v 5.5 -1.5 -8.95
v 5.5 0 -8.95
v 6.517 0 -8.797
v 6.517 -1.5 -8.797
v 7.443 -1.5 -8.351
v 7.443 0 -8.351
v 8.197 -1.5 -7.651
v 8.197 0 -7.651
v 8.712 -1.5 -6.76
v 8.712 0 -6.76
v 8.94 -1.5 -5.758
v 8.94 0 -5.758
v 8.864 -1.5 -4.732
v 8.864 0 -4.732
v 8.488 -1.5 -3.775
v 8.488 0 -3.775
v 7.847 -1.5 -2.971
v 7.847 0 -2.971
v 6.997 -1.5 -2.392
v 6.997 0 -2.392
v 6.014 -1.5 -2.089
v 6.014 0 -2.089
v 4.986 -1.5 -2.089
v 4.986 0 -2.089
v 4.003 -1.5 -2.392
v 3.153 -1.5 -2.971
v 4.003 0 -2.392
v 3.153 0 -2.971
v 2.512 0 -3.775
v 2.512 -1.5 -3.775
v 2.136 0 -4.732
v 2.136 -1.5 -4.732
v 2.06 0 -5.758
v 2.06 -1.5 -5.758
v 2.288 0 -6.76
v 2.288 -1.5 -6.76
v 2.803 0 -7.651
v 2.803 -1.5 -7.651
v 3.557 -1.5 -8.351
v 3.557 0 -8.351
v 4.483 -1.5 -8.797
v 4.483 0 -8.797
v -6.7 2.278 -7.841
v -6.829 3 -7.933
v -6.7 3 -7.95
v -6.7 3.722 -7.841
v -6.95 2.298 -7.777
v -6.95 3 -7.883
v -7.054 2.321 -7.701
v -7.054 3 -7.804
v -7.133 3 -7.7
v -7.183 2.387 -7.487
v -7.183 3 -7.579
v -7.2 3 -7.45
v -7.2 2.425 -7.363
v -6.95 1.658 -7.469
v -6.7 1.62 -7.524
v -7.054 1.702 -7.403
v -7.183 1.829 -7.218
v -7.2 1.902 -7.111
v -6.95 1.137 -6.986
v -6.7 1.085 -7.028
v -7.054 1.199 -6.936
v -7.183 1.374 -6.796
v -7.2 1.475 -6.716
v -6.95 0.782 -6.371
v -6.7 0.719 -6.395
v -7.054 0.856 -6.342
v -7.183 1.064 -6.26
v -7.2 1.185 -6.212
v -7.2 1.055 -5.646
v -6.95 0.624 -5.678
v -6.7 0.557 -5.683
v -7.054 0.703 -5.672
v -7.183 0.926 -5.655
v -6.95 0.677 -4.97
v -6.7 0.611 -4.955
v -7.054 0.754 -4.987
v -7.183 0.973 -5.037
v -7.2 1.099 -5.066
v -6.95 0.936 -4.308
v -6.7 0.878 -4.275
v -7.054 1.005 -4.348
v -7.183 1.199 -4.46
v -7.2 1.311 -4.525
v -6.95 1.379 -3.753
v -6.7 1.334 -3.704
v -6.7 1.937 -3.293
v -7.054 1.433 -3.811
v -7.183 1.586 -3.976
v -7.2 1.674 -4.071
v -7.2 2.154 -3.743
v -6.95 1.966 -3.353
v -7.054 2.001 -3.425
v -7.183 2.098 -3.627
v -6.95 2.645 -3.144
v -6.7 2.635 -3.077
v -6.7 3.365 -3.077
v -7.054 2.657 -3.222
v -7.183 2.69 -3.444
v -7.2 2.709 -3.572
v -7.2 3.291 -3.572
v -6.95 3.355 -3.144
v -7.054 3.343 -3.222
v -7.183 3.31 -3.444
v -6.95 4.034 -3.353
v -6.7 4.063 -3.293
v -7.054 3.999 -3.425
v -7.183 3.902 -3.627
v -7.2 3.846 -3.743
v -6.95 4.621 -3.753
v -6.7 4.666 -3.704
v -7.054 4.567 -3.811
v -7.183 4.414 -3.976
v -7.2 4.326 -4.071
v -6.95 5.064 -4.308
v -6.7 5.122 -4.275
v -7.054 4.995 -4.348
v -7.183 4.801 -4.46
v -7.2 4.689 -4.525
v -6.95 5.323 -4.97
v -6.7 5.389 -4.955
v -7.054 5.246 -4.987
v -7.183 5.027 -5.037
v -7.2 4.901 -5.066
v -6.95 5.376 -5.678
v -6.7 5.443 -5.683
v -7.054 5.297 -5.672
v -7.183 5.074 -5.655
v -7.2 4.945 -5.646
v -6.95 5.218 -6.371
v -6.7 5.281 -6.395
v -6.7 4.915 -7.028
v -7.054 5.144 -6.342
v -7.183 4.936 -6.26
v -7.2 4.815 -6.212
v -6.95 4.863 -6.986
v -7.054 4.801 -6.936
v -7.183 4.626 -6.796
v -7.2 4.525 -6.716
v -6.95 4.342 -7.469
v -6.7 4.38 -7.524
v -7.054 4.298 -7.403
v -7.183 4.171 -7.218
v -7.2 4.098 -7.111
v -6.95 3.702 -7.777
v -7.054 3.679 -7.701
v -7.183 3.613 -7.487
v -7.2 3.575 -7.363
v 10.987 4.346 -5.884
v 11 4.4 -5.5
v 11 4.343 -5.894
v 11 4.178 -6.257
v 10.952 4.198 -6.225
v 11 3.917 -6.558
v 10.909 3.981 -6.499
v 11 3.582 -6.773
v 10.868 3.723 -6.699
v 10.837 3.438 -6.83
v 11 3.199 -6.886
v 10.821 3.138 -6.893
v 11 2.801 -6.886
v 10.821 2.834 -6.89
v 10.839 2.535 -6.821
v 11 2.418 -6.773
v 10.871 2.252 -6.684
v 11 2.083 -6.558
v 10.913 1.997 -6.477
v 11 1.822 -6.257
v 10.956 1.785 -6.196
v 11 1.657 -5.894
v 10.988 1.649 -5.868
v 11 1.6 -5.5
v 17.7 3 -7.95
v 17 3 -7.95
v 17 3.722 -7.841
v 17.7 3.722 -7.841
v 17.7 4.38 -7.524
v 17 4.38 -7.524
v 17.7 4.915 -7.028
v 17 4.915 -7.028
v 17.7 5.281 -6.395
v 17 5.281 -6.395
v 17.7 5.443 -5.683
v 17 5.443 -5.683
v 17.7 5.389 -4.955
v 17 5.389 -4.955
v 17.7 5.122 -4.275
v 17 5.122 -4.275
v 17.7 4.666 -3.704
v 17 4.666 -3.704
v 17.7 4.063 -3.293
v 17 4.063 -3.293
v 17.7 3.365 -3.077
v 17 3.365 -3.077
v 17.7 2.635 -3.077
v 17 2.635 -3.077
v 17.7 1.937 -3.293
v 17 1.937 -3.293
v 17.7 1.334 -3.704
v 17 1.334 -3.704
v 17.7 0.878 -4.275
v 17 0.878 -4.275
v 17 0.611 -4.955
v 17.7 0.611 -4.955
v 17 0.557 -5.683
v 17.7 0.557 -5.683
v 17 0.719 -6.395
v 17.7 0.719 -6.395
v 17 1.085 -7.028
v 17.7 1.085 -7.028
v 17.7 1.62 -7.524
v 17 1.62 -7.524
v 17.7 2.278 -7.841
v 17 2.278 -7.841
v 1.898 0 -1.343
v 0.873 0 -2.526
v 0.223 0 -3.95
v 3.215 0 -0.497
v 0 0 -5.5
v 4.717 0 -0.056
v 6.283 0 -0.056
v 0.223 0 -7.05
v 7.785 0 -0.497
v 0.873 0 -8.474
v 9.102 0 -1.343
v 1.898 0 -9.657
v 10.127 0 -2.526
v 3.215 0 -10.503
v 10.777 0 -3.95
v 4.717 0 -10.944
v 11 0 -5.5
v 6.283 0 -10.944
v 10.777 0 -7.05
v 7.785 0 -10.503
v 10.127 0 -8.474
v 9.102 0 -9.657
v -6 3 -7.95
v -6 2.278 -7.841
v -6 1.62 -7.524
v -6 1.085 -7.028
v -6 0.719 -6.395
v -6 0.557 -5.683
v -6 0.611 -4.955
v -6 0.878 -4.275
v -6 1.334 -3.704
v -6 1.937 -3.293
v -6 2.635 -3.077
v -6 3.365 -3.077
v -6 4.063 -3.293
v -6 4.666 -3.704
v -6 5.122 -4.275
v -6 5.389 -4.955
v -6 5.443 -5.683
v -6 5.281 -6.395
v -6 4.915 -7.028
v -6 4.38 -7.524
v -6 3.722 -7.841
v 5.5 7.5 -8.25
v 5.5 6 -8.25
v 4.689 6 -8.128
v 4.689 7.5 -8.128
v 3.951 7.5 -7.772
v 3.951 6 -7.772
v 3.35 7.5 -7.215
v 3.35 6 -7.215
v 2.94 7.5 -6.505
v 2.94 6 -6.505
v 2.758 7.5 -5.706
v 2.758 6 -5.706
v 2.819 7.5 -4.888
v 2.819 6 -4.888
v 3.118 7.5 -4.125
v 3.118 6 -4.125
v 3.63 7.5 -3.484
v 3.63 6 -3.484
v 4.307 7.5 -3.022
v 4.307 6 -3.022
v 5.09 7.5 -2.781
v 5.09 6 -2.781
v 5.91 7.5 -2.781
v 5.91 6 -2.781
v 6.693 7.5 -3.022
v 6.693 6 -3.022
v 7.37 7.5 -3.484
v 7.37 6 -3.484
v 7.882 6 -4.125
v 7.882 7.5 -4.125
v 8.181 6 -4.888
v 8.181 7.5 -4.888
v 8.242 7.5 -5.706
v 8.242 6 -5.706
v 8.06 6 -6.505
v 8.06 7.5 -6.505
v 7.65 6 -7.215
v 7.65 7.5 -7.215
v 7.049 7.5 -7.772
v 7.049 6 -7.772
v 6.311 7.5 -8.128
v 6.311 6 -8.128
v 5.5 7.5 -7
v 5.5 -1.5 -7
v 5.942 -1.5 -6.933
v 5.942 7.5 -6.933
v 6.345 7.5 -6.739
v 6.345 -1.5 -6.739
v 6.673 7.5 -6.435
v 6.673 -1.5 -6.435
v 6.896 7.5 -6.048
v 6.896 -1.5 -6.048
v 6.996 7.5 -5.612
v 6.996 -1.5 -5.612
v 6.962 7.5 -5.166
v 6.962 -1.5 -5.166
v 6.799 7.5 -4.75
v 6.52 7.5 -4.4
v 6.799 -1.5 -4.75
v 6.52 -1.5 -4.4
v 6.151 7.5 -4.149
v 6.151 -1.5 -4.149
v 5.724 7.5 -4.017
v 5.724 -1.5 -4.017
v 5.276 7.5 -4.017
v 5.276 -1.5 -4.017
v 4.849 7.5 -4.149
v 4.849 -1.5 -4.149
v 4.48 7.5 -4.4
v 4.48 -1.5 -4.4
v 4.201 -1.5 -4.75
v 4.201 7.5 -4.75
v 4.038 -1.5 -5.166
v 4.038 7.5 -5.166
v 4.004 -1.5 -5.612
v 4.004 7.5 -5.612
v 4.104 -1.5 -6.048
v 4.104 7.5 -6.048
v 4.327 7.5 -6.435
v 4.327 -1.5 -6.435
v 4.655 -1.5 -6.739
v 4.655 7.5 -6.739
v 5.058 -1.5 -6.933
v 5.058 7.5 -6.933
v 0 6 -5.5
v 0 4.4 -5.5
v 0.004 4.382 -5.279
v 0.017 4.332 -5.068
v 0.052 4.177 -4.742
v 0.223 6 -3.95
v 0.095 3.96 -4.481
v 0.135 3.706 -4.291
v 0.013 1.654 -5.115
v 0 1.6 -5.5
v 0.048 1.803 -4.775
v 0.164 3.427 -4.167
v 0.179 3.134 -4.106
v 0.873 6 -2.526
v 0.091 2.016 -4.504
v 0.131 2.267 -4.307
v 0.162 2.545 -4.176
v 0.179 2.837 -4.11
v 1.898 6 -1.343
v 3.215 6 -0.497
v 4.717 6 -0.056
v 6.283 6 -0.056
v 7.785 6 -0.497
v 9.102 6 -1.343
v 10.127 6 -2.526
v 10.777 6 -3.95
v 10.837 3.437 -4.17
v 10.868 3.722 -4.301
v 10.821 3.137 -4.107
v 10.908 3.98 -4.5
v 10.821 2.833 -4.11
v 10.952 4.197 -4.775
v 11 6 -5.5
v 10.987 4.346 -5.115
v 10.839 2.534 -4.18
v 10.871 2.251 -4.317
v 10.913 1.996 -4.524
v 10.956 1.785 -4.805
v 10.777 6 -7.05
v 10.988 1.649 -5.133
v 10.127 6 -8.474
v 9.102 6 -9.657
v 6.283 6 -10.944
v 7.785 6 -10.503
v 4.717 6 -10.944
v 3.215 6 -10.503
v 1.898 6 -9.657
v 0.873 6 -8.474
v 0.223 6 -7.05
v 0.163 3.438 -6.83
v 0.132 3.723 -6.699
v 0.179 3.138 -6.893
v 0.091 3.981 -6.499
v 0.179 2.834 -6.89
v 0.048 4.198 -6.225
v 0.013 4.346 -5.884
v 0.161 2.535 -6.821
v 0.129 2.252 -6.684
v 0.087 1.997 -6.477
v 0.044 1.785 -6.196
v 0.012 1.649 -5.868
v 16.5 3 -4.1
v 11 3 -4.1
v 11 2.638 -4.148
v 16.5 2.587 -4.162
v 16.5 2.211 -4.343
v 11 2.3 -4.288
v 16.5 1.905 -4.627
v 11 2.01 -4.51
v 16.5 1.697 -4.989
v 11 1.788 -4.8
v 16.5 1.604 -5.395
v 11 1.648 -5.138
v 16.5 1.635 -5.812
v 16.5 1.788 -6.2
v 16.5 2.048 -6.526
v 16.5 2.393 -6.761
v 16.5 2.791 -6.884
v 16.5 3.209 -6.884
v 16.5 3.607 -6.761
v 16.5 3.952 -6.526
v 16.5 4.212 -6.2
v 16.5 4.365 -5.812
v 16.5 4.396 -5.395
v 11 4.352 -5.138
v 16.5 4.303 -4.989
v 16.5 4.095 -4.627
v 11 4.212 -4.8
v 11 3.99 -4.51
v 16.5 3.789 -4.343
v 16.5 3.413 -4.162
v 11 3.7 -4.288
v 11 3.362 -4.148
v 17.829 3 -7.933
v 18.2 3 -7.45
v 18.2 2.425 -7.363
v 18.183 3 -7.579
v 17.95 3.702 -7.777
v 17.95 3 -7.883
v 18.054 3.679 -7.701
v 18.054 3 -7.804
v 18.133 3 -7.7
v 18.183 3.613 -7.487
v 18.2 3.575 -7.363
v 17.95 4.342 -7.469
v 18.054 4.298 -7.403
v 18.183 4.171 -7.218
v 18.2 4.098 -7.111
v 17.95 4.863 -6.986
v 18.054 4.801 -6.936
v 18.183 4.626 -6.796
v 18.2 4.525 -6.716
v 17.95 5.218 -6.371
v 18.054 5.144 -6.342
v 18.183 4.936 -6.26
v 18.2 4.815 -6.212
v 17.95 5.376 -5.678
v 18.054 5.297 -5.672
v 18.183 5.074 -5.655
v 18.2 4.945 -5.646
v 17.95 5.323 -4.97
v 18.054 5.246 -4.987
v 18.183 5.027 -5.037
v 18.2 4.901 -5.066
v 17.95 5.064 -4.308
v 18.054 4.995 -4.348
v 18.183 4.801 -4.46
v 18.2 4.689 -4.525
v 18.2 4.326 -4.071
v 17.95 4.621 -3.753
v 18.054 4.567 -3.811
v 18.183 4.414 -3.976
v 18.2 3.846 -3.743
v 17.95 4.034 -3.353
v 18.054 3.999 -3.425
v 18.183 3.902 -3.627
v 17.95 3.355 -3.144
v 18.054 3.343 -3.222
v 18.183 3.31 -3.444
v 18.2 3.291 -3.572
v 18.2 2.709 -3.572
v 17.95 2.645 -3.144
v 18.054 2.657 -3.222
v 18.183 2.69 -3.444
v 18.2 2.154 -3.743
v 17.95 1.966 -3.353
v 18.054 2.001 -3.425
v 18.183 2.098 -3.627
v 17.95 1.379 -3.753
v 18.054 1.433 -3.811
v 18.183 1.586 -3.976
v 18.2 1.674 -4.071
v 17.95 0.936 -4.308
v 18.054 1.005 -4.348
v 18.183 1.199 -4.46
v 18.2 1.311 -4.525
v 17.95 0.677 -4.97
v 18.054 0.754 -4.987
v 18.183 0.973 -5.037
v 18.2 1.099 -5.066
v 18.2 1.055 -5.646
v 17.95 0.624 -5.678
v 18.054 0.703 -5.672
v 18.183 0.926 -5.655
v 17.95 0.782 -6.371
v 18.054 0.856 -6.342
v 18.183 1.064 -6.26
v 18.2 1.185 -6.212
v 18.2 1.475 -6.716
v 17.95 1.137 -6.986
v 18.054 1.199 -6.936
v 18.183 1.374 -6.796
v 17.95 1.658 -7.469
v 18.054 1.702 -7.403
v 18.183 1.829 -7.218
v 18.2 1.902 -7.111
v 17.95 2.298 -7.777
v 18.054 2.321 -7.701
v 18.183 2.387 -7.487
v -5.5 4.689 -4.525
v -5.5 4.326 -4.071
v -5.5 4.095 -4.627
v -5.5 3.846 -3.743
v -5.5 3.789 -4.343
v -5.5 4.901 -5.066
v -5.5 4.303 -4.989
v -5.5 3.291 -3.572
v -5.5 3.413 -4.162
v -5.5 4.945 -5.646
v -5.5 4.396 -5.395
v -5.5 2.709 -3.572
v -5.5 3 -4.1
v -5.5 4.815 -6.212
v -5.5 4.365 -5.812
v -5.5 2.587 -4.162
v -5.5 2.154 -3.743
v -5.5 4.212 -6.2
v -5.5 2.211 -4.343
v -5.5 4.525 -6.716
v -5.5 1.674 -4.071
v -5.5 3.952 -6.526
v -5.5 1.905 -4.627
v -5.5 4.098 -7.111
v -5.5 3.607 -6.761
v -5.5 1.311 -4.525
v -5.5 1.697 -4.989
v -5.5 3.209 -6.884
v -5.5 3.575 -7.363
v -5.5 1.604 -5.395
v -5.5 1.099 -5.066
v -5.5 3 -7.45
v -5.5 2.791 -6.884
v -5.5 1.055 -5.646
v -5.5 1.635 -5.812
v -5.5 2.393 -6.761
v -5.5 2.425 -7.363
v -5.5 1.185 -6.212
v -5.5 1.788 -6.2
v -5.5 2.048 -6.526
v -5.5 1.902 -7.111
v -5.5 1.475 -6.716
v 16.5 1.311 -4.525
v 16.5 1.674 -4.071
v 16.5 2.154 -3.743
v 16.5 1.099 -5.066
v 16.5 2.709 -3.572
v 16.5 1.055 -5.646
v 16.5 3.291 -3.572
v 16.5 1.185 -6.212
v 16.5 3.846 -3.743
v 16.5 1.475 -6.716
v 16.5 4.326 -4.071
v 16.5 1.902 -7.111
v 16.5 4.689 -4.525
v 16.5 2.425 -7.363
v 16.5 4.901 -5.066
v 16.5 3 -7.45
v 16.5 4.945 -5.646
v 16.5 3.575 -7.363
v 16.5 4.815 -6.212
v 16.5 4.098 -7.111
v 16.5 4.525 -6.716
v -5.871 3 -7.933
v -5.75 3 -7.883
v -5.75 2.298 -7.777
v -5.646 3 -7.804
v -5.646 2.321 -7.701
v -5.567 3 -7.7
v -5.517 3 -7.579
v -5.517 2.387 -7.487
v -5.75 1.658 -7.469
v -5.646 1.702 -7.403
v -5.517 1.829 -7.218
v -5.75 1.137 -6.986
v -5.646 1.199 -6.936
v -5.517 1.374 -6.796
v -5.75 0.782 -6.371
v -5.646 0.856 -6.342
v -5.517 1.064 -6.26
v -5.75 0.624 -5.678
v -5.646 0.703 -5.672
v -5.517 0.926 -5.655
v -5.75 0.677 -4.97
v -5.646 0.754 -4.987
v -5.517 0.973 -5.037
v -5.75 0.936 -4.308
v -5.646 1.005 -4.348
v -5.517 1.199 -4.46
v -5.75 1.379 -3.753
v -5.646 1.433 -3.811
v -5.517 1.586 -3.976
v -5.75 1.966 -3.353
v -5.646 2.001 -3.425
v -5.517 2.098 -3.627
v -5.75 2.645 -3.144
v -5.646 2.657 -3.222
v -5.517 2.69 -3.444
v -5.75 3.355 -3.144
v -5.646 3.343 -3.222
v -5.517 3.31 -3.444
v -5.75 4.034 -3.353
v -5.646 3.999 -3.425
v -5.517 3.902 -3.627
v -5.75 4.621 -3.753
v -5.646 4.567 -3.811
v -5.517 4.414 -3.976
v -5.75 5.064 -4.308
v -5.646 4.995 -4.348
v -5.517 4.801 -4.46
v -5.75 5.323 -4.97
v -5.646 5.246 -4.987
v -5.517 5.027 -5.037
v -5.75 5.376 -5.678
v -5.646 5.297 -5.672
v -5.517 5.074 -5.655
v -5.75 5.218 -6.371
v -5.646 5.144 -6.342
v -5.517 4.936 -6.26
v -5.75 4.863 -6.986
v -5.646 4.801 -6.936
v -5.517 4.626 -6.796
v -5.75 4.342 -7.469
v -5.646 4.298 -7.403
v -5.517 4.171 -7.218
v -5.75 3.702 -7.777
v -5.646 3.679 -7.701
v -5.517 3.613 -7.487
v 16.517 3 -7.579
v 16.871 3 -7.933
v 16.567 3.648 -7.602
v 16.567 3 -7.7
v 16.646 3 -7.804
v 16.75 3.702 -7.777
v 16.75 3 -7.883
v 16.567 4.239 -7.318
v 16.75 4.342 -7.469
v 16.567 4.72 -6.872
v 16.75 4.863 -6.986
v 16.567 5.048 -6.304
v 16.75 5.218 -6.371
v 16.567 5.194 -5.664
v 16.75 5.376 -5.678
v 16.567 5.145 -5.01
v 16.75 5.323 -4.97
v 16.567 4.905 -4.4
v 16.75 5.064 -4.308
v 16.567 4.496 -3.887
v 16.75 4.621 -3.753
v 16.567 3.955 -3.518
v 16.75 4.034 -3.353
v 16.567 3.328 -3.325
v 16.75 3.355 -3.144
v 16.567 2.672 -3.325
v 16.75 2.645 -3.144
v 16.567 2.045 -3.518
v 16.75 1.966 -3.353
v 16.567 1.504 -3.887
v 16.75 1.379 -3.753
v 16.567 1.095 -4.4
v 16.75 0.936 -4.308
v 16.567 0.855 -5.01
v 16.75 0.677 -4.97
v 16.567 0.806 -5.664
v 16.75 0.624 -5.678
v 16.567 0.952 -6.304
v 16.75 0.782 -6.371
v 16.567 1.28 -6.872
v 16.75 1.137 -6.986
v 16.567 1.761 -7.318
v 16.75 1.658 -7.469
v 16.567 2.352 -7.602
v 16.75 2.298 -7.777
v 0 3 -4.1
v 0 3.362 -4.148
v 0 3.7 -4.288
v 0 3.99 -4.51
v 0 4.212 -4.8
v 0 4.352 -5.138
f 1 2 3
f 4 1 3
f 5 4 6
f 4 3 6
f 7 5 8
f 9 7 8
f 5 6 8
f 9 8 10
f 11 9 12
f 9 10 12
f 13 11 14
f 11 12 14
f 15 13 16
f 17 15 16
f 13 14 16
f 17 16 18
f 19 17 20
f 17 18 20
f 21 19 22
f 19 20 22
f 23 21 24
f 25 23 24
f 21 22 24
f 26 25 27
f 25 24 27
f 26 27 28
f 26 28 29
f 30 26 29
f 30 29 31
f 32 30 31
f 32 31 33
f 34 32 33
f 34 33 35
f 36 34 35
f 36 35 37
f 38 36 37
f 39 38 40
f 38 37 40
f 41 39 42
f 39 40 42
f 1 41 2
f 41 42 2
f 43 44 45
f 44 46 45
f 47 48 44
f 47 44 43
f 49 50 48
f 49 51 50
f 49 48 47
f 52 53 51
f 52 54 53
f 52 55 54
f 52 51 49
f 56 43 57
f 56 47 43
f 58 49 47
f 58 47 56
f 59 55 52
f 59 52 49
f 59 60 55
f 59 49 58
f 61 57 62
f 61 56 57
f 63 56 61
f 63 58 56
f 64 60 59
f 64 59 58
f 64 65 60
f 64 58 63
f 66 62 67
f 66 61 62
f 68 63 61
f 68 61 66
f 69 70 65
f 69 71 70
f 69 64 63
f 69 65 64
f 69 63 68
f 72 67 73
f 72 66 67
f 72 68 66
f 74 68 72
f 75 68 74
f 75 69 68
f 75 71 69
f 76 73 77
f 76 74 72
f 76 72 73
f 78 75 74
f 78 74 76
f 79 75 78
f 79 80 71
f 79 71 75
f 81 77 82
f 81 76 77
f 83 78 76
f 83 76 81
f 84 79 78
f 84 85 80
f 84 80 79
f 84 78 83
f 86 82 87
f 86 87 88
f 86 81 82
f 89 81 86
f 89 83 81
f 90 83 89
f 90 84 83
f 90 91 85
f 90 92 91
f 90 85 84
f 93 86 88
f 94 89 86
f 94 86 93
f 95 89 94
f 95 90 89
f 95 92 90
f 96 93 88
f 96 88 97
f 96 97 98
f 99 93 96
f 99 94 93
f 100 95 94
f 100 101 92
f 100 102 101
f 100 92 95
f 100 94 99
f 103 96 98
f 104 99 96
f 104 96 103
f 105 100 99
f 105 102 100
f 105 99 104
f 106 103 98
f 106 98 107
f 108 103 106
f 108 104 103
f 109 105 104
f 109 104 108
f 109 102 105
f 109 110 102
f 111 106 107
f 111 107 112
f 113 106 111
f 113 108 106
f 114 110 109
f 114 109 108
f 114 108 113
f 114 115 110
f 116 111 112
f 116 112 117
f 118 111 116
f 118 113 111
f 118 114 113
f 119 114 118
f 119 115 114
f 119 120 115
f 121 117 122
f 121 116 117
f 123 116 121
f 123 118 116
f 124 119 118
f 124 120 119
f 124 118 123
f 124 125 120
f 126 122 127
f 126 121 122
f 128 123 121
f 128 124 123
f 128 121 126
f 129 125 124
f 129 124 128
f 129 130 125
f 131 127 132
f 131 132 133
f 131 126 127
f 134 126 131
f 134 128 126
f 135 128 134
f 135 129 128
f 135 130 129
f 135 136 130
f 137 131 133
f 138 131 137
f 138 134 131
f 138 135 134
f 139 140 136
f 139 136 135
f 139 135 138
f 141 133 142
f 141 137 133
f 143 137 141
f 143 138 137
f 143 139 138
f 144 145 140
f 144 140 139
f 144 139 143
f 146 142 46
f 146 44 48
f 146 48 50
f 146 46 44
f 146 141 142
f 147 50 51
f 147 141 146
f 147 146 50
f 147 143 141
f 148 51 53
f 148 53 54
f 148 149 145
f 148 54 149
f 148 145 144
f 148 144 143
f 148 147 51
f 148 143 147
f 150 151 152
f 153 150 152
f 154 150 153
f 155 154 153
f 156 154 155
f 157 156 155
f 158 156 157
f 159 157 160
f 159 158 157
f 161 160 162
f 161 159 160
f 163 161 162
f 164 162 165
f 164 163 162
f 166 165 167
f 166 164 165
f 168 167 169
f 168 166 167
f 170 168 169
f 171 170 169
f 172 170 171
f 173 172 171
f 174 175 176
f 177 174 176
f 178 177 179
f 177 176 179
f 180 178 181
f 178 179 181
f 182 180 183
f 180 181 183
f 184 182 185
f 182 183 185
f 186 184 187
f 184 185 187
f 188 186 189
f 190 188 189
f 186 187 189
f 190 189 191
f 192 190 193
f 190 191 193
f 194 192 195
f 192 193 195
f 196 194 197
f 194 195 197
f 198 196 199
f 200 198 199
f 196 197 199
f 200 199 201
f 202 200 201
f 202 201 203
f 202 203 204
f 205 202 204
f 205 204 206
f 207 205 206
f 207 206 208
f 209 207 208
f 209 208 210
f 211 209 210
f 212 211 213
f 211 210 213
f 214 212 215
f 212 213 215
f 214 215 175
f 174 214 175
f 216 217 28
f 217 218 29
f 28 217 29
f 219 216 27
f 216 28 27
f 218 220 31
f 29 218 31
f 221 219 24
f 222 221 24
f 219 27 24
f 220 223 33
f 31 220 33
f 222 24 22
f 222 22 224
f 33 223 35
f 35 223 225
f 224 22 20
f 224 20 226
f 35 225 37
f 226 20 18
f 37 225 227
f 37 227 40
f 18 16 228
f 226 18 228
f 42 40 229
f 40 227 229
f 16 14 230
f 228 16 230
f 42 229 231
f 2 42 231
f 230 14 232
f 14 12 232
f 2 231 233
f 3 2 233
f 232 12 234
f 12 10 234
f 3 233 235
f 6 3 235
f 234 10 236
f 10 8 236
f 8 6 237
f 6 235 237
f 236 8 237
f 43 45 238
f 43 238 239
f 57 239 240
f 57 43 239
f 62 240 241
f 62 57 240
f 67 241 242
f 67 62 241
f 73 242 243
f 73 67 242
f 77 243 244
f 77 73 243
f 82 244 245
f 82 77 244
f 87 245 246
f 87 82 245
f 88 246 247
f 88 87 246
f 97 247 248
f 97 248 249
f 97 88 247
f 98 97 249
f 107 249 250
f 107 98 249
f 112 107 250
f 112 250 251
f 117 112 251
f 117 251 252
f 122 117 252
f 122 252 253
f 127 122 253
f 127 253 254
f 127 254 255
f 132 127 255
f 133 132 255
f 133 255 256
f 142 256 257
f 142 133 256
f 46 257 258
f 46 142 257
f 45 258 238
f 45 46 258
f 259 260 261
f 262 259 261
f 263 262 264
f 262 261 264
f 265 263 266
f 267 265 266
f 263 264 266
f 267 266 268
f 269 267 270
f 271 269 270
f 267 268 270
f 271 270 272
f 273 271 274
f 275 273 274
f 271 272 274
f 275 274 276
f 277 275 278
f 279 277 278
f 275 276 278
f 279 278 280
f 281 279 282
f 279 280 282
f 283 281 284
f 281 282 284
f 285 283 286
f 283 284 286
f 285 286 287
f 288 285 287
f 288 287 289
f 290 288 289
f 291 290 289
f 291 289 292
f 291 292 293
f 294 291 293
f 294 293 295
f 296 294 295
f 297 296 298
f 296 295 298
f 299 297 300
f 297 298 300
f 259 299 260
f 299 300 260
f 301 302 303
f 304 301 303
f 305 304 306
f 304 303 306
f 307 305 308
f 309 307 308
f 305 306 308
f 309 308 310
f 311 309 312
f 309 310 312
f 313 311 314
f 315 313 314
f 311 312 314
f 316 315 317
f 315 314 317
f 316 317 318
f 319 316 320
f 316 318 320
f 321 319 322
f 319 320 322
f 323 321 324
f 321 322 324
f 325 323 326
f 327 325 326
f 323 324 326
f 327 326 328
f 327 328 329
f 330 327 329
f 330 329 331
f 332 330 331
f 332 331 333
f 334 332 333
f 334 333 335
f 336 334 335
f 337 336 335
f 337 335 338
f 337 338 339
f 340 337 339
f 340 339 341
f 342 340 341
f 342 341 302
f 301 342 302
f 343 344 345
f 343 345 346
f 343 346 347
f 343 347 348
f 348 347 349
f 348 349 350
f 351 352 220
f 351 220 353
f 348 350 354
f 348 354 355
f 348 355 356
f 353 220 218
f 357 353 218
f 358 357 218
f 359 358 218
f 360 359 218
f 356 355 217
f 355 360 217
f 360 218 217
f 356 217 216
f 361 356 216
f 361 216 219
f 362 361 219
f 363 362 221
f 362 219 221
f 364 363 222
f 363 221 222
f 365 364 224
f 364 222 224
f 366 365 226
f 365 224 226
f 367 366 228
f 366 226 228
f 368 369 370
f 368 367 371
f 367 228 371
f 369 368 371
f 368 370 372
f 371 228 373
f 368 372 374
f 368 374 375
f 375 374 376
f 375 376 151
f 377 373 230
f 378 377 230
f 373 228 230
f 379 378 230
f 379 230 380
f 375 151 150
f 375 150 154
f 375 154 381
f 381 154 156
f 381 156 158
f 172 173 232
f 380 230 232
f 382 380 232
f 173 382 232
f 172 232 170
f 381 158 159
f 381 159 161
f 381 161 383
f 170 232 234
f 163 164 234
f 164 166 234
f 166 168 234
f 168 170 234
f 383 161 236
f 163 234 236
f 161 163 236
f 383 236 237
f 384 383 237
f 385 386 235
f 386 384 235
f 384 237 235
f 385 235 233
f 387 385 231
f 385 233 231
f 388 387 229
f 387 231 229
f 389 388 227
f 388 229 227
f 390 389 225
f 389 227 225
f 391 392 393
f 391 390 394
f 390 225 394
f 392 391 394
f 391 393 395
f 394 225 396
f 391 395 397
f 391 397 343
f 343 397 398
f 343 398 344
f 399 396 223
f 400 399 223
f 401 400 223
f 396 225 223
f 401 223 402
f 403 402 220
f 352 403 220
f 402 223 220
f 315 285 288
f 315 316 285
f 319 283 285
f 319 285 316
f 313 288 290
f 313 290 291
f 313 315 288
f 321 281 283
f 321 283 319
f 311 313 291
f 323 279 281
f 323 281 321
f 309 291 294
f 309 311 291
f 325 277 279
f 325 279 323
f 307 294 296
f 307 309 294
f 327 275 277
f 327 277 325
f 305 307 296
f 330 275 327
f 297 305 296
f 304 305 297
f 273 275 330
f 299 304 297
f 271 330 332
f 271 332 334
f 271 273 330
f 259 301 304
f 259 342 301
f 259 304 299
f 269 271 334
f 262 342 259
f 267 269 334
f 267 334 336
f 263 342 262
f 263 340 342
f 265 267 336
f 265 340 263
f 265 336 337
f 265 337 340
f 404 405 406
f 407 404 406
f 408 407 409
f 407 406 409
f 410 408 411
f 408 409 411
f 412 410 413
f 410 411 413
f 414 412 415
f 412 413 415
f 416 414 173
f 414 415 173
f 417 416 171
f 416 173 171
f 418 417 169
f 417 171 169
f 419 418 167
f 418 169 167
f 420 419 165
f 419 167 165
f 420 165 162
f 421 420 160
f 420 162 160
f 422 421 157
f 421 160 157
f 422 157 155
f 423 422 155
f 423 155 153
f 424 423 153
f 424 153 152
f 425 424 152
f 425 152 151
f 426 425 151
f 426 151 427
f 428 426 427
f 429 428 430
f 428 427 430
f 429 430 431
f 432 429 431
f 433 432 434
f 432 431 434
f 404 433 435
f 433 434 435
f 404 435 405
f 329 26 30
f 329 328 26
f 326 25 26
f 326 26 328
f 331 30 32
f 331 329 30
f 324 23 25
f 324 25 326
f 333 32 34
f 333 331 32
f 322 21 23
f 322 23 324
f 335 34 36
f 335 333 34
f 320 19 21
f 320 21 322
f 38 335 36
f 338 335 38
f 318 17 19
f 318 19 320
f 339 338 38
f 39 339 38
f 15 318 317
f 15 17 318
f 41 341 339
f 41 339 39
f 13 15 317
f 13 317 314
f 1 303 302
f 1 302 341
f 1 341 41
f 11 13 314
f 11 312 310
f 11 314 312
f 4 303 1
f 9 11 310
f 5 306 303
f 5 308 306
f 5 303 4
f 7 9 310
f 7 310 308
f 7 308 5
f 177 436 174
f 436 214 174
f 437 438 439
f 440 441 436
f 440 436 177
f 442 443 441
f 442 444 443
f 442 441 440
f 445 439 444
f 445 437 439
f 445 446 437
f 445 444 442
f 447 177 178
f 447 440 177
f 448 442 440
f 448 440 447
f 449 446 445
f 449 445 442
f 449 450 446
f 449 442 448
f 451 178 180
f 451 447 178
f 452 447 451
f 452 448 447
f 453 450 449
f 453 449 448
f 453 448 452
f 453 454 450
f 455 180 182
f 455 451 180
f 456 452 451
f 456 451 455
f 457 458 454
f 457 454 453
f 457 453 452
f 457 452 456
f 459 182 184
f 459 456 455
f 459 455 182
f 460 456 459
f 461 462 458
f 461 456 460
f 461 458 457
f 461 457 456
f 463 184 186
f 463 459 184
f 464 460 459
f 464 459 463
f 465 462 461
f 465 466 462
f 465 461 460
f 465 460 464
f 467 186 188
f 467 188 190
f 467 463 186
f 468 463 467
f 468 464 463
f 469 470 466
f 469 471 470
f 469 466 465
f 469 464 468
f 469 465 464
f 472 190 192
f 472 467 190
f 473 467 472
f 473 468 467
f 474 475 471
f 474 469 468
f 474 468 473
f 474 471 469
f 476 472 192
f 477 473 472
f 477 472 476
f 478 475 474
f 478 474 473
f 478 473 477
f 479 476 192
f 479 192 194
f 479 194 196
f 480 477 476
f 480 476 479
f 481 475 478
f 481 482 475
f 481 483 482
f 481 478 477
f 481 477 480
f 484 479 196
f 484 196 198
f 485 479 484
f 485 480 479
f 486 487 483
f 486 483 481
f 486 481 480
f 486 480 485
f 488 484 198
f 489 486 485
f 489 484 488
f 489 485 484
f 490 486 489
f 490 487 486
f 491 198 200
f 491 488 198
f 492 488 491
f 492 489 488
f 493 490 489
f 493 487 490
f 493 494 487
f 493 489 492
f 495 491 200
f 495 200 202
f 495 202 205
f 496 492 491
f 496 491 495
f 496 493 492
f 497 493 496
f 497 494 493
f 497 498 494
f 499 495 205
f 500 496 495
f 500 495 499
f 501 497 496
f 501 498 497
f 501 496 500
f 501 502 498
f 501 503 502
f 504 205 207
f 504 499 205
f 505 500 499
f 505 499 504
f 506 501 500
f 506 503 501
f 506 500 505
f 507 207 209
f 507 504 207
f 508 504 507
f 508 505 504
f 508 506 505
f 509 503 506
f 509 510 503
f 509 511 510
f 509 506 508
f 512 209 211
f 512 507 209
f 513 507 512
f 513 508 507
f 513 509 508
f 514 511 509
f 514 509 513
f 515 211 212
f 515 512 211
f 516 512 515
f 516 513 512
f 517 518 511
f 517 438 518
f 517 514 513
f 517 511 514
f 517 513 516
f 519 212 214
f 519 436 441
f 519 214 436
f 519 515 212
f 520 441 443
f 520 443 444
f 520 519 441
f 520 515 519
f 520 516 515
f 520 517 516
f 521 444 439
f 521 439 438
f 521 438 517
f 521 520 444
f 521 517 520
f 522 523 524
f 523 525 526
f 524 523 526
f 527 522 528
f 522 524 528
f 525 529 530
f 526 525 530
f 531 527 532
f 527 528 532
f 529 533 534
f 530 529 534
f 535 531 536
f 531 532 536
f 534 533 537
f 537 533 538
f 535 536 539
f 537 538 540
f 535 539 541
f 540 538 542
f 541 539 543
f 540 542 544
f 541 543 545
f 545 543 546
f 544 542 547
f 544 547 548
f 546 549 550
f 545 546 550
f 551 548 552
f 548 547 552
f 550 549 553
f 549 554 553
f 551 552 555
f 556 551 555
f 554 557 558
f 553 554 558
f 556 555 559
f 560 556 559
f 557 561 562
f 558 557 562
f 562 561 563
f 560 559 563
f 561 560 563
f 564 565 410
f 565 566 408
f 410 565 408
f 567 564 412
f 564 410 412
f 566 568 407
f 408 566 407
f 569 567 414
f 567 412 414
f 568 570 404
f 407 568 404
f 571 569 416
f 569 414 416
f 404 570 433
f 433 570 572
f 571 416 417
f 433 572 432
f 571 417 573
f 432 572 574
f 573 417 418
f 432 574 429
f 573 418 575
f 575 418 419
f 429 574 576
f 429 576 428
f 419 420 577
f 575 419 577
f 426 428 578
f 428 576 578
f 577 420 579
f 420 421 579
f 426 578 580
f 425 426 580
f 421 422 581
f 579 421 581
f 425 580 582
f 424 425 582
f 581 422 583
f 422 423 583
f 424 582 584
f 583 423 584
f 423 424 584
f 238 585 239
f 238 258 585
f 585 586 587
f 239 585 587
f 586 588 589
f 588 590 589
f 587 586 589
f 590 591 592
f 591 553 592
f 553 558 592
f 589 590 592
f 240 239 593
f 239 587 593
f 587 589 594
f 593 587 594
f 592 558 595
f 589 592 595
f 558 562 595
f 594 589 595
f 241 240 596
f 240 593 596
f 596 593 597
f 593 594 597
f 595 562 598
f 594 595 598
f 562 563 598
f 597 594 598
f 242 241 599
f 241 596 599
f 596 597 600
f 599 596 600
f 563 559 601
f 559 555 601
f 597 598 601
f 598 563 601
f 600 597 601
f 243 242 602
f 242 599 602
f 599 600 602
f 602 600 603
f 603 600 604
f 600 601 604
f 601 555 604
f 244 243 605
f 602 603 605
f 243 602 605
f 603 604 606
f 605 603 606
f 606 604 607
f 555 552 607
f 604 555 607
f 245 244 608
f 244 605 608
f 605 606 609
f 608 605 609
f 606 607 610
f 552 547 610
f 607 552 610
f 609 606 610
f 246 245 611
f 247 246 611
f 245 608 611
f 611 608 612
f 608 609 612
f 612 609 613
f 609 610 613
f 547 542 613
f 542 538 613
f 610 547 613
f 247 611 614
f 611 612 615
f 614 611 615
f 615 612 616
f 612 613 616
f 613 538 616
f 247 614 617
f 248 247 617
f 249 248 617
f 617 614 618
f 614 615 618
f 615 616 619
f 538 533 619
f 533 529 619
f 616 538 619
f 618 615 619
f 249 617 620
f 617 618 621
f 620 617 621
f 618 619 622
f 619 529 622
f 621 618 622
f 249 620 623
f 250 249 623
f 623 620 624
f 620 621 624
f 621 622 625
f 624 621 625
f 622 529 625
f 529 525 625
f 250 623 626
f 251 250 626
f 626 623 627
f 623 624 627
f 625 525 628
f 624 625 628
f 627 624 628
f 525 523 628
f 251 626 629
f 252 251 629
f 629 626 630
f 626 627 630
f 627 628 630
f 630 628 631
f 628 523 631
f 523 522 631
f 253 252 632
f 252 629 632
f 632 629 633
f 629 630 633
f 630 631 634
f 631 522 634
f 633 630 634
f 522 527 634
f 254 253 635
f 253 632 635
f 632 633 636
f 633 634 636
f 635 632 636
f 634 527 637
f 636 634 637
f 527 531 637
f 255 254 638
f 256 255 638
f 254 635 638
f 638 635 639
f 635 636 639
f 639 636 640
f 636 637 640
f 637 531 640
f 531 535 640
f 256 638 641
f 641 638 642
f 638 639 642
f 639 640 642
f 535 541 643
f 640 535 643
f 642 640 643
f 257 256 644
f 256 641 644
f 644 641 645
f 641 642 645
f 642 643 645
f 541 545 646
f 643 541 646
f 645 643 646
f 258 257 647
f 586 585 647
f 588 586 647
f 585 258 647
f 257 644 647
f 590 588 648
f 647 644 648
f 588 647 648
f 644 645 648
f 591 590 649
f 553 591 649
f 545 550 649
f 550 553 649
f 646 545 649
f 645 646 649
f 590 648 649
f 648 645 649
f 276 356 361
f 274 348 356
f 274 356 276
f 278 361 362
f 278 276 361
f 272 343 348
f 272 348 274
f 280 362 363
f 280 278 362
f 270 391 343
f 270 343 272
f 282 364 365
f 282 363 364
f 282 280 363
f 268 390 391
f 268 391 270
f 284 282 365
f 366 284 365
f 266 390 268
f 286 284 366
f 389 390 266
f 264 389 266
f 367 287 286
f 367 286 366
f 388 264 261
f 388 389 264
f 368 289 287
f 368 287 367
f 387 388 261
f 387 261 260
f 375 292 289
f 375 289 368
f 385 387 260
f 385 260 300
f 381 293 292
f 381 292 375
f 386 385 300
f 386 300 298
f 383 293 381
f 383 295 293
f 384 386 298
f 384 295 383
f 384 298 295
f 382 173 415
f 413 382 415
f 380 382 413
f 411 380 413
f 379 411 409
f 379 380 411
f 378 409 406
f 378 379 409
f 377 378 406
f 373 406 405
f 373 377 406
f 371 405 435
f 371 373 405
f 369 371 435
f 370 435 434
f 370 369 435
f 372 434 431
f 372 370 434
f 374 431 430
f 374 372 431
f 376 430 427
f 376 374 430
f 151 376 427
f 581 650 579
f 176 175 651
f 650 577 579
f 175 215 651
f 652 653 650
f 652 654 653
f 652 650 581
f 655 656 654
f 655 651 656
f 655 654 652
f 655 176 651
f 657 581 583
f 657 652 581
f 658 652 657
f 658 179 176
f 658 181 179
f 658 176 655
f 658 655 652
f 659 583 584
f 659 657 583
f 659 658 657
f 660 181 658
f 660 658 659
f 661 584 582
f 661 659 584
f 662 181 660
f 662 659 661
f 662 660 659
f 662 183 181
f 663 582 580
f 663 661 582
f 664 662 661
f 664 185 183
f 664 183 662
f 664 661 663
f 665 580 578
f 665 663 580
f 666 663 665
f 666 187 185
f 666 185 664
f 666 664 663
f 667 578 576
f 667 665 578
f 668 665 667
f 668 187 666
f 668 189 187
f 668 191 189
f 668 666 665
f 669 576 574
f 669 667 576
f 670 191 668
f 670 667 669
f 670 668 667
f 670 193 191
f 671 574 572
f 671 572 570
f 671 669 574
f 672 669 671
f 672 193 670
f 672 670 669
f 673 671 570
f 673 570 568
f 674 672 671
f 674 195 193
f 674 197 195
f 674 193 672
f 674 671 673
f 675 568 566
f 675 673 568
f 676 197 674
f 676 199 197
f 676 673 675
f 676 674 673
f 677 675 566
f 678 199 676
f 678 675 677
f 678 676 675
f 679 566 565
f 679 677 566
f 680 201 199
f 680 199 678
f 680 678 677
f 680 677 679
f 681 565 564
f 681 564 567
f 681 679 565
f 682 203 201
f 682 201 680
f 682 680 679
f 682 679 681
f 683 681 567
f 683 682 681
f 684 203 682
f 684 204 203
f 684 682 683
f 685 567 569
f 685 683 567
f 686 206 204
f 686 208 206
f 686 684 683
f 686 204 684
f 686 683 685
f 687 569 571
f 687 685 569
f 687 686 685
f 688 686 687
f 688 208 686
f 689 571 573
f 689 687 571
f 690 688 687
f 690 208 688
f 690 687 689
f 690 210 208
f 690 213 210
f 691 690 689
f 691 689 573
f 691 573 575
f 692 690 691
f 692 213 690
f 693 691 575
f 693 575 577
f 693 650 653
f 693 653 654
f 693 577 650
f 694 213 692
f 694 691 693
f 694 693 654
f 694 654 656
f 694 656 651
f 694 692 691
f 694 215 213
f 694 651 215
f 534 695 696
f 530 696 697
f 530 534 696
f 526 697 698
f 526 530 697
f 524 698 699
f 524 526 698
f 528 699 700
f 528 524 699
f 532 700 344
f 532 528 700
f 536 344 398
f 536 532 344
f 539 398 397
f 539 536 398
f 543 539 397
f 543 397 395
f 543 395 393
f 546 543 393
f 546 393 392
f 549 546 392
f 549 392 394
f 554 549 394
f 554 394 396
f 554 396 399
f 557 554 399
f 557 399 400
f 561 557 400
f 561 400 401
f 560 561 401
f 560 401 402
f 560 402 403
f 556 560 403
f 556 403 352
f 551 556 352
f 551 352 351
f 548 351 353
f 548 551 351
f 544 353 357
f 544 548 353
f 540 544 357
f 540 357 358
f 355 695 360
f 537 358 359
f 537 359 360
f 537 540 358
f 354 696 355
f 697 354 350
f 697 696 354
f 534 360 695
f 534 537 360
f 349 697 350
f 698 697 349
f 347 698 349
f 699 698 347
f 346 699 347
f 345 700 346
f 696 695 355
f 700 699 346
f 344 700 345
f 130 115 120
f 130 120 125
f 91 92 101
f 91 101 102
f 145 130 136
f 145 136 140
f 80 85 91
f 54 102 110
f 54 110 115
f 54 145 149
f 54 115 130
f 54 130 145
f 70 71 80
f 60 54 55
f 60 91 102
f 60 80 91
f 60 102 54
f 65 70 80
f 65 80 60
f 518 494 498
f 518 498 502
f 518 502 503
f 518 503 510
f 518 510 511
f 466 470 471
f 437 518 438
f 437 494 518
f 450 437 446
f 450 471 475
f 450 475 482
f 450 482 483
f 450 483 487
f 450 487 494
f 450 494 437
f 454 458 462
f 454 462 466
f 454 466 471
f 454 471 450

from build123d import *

# Parameters (mm, degrees)
SKETCH1_W      = 11
SKETCH1_H      = 11
EXTRUDE1_DEPTH = 6
SKETCH2_R      = 1.4
EXTRUDE2_DEPTH = 5.5
EXTRUDE3_START = 5.5
SKETCH3_R      = 1.4
EXTRUDE3_DEPTH = 5.5
SKETCH4_R      = 2.75
EXTRUDE4_DEPTH = 1.5
SKETCH5_R      = 3.45
EXTRUDE5_DEPTH = 1.5
SKETCH6_R      = 2.45
EXTRUDE6_DEPTH = 1.7
EXTRUDE7_START = 1.7
SKETCH7_R      = 2.45
EXTRUDE7_DEPTH = 1.7
SKETCH8_R      = 1.5
EXTRUDE8_DEPTH = 24.091989953
FILLET1_R      = 5.5
FILLET3_R      = 0.5


with BuildPart() as part:
    # Sketch1 → Extrude1 (new body)
    with BuildSketch(Plane(origin=(0, 0, 0), x_dir=(1, 0, 0), z_dir=(0, 1, 0))):
        with Locations((5.5, 5.5)):
            Rectangle(SKETCH1_W, SKETCH1_H)
    extrude(amount=EXTRUDE1_DEPTH)

    # Sketch2 → Extrude2 (add)
    with BuildSketch(Plane(origin=(11, 0, 0), x_dir=(0, 0, -1), z_dir=(1, 0, 0))):
        with Locations(Location((5.5, 3, 0), (0, 0, 180))):
            Circle(SKETCH2_R)
    extrude(amount=EXTRUDE2_DEPTH)

    # Sketch3 → Extrude3 (add)
    with BuildSketch(Plane.ZY.offset(EXTRUDE3_START)):
        with Locations((-5.5, 3)):
            Circle(SKETCH3_R)
    extrude(amount=-EXTRUDE3_DEPTH)

    # Sketch4 → Extrude4 (add)
    with BuildSketch(Plane(origin=(0, 6, 0), x_dir=(1, 0, 0), z_dir=(0, 1, 0))):
        with Locations(Location((5.5, 5.5, 0), (0, 0, 90))):
            Circle(SKETCH4_R)
    extrude(amount=EXTRUDE4_DEPTH)

    # Sketch5 → Extrude5 (add)
    with BuildSketch(Plane.XZ):
        with Locations(Location((5.5, -5.5, 0), (0, 0, 270))):
            Circle(SKETCH5_R)
    extrude(amount=EXTRUDE5_DEPTH)

    # Sketch6 → Extrude6 (add)
    with BuildSketch(Plane(origin=(16.5, 0, 0), x_dir=(0, 0, -1), z_dir=(1, 0, 0))):
        with Locations((5.5, 3)):
            Circle(SKETCH6_R)
    extrude(amount=EXTRUDE6_DEPTH)

    # Sketch7 → Extrude7 (add)
    with BuildSketch(Plane.ZY.offset(5.5).offset(EXTRUDE7_START)):
        with Locations(Location((-5.5, 3, 0), (0, 0, 180))):
            Circle(SKETCH7_R)
    extrude(amount=-EXTRUDE7_DEPTH)

    # Sketch8 → Extrude8 (cut, through all)
    with BuildSketch(Plane.XZ.offset(1.5)):
        with Locations(Location((5.5, -5.5, 0), (0, 0, 270))):
            Circle(SKETCH8_R)
    extrude(amount=-EXTRUDE8_DEPTH, mode=Mode.SUBTRACT)

    # Fillet1
    # the kernel refuses this fillet: 5.5 mm, written as the material it takes off along each edge
    with BuildSketch(Plane(origin=(0, -13.75, 0), x_dir=(0, 0, -1), z_dir=(0, 1, 0))) as fillet1_piece_1_section:
        with BuildLine():
            CenterArc((FILLET1_R, -FILLET1_R), FILLET1_R, 90, 90)
            Line((0, -FILLET1_R), (0, 0))
            Line((0, 0), (FILLET1_R, 0))
        make_face()
    fillet1_piece_1 = extrude(amount=33.5, mode=Mode.PRIVATE)
    fillet1_piece_1 = fillet1_piece_1 - Plane(origin=(1.247523626, 3, -5.5), x_dir=(0, 0, 1), z_dir=(-1, 0, 0)) * Cylinder(1.4, 89, mode=Mode.PRIVATE)
    with BuildSketch(Plane(origin=(0, -13.75, -11), x_dir=(0, 0, 1), z_dir=(0, 1, 0))) as fillet1_piece_2_section:
        with BuildLine():
            CenterArc((FILLET1_R, FILLET1_R), FILLET1_R, 180, 90)
            Line((0, FILLET1_R), (0, 0))
            Line((0, 0), (FILLET1_R, 0))
        make_face()
    fillet1_piece_2 = extrude(amount=33.5, mode=Mode.PRIVATE)
    fillet1_piece_2 = fillet1_piece_2 - Plane(origin=(1.247523509, 3, -5.5), x_dir=(0, 0, 1), z_dir=(-1, 0, 0)) * Cylinder(1.4, 89, mode=Mode.PRIVATE)
    with BuildSketch(Plane(origin=(11, -13.75, -11), x_dir=(-1, 0, 0), z_dir=(0, 1, 0))) as fillet1_piece_3_section:
        with BuildLine():
            CenterArc((FILLET1_R, FILLET1_R), FILLET1_R, 180, 90)
            Line((0, FILLET1_R), (0, 0))
            Line((0, 0), (FILLET1_R, 0))
        make_face()
    fillet1_piece_3 = extrude(amount=33.5, mode=Mode.PRIVATE)
    fillet1_piece_3 = fillet1_piece_3 - Plane(origin=(9.752477266, 3, -5.5), x_dir=(0, 0, 1), z_dir=(-1, 0, 0)) * Cylinder(1.4, 89, mode=Mode.PRIVATE)
    with BuildSketch(Plane(origin=(11, -13.75, 0), x_dir=(-1, 0, 0), z_dir=(0, 1, 0))) as fillet1_piece_4_section:
        with BuildLine():
            CenterArc((FILLET1_R, -FILLET1_R), FILLET1_R, 90, 90)
            Line((0, -FILLET1_R), (0, 0))
            Line((0, 0), (FILLET1_R, 0))
        make_face()
    fillet1_piece_4 = extrude(amount=33.5, mode=Mode.PRIVATE)
    fillet1_piece_4 = fillet1_piece_4 - Plane(origin=(9.752475868, 3, -5.5), x_dir=(0, 0, 1), z_dir=(-1, 0, 0)) * Cylinder(1.4, 89, mode=Mode.PRIVATE)
    add([fillet1_piece_1, fillet1_piece_2, fillet1_piece_3, fillet1_piece_4], mode=Mode.SUBTRACT)

    # Fillet3
    fillet3_edges = [part.edges().sort_by_distance(p)[0] for p in [
        (16.5, 3, -3.05),
        (18.2, 3, -3.05),
        (-5.5, 3, -3.05),
        (-7.2, 3, -3.05),
    ]]
    fillet(fillet3_edges, radius=FILLET3_R)


solid = part.part
